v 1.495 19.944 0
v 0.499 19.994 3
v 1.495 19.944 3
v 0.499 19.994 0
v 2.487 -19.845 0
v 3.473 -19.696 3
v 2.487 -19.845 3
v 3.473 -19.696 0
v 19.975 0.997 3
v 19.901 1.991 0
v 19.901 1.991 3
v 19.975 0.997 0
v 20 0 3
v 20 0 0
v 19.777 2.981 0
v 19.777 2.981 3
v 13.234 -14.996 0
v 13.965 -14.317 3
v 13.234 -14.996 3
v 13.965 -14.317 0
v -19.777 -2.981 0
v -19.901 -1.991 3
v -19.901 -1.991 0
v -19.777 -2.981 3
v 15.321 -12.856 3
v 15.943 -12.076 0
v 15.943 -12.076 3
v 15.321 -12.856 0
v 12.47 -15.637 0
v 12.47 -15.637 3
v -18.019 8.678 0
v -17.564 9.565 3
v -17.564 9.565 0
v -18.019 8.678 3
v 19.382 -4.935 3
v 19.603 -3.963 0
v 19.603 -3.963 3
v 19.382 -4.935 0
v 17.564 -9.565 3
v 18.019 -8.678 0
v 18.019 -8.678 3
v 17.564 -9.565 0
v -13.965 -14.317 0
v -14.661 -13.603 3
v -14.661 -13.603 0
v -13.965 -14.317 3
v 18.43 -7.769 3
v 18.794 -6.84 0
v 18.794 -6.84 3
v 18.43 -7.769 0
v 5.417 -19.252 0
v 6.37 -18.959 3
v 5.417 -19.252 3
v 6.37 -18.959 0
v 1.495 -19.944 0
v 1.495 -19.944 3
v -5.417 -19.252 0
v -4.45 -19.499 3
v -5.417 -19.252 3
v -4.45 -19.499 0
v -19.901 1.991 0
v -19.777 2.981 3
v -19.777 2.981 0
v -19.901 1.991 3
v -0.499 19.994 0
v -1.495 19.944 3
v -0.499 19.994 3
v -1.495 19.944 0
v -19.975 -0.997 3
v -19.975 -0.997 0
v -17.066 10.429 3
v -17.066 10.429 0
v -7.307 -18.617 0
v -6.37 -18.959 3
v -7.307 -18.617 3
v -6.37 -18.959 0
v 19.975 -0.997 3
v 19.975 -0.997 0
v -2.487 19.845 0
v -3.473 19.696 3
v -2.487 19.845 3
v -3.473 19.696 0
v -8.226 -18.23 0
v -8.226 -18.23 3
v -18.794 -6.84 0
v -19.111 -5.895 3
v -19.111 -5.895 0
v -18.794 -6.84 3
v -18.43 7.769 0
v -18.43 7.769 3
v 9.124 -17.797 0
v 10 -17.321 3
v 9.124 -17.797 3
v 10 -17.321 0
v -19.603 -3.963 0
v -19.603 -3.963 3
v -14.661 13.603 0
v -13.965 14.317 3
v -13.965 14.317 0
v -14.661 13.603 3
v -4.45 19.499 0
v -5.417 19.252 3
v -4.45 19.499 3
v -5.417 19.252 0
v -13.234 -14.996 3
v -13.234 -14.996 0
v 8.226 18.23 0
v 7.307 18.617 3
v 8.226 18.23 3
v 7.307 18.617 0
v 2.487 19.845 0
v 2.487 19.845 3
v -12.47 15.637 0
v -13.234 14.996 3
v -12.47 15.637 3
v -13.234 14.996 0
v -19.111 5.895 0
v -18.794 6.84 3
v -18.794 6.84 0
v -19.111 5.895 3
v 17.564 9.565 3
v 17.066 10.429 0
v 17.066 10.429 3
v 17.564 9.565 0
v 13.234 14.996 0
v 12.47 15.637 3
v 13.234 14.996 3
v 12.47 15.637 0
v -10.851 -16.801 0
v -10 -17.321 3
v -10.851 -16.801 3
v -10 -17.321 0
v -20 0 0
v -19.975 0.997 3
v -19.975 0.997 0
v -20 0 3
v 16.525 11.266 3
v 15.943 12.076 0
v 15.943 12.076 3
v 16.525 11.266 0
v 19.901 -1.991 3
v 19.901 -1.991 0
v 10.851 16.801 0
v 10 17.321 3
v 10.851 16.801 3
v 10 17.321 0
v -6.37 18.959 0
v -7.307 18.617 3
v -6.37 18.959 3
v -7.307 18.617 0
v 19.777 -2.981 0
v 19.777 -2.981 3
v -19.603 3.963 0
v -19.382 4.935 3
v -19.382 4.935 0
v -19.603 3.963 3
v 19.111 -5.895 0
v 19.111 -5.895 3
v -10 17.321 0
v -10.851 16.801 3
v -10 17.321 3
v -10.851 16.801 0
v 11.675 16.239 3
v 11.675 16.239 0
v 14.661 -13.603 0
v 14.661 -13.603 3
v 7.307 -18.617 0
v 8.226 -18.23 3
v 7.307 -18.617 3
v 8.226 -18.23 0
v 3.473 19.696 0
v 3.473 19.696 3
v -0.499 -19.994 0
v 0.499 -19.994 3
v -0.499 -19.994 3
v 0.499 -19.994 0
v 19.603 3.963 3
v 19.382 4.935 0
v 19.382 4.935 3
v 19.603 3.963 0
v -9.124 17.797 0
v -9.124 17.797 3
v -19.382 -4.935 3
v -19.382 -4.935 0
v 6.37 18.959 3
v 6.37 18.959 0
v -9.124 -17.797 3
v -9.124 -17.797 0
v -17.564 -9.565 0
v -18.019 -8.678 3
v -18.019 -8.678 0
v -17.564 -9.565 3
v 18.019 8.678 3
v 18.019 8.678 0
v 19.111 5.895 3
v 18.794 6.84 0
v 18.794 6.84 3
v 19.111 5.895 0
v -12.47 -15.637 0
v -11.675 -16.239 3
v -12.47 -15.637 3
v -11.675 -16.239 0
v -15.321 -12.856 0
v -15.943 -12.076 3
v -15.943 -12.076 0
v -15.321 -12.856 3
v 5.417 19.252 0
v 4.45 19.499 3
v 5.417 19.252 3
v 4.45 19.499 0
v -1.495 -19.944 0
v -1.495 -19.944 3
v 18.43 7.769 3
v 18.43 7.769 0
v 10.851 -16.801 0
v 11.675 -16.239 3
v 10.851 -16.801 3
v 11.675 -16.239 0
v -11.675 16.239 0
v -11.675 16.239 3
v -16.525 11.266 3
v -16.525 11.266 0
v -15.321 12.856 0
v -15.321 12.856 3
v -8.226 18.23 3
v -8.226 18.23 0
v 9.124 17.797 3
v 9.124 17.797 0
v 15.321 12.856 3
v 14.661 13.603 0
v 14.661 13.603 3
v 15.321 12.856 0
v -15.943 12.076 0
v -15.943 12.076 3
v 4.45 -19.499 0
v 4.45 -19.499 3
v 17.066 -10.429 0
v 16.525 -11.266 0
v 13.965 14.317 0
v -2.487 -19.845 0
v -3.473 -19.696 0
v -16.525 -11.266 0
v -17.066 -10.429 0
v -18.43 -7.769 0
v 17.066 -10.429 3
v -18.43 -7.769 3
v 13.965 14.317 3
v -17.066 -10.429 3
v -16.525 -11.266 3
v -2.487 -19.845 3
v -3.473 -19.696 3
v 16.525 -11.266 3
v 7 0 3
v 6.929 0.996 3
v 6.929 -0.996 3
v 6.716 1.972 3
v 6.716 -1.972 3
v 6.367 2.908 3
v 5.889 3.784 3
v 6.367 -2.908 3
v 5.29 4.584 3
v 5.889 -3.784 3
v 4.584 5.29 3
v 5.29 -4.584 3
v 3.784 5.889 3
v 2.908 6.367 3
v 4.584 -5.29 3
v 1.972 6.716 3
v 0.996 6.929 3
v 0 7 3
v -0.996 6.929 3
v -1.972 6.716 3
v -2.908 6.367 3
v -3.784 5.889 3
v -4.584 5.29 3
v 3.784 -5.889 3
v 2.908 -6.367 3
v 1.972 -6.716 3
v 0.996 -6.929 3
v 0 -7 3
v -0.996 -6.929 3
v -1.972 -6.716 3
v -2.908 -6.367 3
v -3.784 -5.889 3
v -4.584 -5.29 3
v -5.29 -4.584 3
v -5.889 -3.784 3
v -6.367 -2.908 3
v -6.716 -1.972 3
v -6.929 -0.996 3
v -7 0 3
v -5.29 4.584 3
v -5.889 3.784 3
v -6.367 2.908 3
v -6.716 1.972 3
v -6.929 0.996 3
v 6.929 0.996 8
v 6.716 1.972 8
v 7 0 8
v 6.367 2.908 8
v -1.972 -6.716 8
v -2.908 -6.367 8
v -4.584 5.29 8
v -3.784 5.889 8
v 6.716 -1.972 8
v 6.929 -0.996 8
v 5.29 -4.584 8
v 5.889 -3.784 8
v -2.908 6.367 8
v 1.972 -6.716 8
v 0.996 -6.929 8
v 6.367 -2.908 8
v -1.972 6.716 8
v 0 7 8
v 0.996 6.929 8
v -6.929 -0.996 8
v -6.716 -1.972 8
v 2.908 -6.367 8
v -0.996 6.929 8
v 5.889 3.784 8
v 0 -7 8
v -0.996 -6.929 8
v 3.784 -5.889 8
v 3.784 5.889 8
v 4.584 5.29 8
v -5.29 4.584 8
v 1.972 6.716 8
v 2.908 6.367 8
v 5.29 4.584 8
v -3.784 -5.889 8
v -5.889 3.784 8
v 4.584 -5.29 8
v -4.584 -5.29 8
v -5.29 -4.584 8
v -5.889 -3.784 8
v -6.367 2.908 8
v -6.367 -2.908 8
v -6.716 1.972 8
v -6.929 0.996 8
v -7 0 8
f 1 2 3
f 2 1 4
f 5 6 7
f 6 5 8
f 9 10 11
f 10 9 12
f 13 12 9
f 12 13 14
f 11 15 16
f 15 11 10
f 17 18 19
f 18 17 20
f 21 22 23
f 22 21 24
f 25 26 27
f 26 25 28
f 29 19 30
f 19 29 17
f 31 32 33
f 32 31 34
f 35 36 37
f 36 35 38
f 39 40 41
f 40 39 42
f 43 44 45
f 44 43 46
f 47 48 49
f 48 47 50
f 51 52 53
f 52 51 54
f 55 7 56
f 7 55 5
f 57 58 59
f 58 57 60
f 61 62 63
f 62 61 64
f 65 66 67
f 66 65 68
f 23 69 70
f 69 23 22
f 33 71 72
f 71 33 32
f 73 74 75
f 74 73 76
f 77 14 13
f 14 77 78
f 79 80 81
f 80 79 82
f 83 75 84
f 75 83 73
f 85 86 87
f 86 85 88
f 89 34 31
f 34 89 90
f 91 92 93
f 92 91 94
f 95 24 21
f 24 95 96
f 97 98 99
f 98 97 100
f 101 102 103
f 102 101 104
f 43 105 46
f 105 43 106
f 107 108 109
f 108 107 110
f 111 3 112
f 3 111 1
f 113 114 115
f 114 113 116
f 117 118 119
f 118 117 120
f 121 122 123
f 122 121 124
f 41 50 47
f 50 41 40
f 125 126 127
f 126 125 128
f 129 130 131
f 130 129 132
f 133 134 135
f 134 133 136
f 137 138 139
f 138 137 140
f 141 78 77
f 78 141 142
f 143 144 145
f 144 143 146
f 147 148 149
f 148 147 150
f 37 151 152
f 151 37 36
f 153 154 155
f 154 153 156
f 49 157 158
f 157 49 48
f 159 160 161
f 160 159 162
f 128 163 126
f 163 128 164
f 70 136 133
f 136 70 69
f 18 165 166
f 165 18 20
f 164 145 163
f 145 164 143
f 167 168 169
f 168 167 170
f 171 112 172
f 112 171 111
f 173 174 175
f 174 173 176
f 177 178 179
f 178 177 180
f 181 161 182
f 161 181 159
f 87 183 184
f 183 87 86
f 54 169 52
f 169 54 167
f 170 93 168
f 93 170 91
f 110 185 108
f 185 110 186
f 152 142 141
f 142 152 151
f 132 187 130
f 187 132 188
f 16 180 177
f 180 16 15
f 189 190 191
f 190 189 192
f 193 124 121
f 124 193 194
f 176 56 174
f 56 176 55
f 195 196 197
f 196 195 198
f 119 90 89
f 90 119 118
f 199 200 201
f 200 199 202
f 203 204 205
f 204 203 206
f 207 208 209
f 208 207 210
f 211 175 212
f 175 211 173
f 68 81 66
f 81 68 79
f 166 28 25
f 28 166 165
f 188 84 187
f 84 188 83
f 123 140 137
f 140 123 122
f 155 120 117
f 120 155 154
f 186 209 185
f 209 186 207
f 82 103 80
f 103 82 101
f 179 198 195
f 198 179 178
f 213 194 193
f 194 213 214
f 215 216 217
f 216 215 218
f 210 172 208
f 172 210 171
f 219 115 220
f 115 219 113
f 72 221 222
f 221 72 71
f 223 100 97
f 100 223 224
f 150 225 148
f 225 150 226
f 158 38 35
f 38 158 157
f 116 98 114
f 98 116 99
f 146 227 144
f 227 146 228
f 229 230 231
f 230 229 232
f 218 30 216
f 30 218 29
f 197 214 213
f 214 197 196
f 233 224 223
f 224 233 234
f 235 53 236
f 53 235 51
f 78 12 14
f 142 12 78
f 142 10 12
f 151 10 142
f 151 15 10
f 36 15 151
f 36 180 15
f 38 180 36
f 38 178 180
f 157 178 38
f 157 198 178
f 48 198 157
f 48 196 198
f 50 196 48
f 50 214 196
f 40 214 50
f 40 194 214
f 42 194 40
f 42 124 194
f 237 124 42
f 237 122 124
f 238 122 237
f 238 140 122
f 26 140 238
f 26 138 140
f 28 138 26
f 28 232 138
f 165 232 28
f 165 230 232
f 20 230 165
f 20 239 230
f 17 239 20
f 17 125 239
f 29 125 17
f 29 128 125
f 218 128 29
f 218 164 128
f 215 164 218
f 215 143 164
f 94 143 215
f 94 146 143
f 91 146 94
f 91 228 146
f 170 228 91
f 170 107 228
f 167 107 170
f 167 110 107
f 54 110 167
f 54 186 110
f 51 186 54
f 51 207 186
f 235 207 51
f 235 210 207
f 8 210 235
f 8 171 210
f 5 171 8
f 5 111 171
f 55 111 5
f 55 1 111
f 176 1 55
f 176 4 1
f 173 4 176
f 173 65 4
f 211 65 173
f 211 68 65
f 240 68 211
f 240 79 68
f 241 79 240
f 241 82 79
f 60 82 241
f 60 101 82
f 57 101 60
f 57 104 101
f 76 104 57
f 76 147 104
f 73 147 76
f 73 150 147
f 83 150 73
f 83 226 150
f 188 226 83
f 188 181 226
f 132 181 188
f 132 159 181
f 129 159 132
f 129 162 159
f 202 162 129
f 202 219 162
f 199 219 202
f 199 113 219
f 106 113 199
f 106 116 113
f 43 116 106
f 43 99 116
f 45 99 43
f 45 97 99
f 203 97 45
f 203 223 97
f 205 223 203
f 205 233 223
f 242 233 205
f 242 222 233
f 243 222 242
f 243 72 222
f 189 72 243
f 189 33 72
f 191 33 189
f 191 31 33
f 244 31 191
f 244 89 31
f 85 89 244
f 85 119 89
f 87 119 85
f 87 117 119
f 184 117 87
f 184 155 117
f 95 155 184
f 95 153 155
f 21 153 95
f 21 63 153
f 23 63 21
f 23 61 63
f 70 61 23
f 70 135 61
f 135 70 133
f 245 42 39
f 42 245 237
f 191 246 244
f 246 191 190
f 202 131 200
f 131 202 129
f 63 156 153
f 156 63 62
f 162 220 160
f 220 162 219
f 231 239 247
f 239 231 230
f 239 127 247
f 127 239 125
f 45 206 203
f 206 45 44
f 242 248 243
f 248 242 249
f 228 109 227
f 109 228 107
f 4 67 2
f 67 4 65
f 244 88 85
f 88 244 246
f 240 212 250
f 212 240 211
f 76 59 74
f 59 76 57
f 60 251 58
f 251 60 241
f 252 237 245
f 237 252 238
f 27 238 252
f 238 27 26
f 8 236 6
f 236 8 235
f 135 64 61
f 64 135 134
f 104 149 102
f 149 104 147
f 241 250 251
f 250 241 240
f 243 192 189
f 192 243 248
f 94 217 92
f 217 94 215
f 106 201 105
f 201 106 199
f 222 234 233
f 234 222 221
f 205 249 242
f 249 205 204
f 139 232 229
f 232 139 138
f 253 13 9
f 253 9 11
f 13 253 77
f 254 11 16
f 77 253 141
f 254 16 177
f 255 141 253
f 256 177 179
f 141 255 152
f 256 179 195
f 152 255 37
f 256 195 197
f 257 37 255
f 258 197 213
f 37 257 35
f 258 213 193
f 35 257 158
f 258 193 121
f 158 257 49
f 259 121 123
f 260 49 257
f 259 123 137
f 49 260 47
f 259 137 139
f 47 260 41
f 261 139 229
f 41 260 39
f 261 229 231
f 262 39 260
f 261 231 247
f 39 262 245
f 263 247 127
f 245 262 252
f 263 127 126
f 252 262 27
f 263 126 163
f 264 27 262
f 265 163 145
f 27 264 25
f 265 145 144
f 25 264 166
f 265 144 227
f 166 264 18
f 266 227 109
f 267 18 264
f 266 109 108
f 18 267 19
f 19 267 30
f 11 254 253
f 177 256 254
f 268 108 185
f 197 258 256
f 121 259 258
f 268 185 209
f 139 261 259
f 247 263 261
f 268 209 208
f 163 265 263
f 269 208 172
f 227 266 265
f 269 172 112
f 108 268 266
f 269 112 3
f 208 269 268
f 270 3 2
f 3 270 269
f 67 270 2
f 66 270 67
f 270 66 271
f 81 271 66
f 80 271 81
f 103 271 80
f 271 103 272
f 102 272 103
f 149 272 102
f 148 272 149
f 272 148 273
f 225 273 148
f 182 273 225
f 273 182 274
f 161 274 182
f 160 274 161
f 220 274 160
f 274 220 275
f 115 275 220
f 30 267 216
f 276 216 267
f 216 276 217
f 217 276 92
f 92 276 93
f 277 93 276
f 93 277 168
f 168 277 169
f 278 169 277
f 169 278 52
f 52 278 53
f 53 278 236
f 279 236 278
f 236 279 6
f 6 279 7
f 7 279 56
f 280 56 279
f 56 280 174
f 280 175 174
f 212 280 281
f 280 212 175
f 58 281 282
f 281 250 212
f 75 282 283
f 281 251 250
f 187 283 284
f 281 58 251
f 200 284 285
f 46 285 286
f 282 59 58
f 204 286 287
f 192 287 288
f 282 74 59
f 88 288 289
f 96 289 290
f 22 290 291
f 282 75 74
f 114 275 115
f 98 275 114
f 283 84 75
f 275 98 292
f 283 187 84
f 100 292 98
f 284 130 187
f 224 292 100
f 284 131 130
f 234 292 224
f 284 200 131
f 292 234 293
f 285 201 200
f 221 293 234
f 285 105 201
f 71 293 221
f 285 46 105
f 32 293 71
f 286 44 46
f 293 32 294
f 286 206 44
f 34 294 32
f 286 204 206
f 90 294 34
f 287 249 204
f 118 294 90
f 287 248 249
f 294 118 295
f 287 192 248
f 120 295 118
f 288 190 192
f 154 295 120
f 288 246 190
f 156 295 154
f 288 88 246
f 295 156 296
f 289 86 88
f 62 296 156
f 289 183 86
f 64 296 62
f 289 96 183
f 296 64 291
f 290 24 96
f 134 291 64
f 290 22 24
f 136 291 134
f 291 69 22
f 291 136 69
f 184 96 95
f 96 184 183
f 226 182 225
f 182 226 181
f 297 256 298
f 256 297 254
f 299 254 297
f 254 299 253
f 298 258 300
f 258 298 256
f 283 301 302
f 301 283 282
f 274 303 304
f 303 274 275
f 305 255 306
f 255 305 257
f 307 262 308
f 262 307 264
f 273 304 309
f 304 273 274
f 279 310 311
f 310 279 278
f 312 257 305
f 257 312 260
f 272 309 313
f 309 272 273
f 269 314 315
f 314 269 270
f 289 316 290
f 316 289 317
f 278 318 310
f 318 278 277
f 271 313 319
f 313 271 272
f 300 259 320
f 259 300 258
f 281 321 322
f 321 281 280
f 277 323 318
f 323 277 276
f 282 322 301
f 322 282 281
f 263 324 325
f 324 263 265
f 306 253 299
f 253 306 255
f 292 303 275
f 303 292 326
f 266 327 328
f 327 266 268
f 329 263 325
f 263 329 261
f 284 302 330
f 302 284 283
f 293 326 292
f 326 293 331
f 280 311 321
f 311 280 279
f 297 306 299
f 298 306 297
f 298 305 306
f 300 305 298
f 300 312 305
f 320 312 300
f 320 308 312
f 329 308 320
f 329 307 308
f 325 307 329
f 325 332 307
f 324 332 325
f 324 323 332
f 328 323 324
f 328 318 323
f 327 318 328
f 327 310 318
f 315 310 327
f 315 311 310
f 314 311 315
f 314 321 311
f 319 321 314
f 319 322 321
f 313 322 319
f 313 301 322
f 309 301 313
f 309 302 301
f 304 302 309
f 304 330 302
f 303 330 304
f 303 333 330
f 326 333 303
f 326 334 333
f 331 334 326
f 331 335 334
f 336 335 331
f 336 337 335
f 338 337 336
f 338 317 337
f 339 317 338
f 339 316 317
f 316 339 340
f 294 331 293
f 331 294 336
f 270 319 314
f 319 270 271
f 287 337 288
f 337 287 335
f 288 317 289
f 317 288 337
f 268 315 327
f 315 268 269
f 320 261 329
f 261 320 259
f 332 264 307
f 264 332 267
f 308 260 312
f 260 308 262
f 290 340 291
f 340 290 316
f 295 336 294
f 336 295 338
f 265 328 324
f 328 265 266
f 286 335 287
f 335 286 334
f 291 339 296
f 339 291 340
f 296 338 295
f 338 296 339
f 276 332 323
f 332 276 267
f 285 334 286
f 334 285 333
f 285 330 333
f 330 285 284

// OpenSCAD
$fa = 1;
$fs = 1;

height = 3;

cylinder(height, 20, 20);
cylinder(height + 5, 7, 7);
